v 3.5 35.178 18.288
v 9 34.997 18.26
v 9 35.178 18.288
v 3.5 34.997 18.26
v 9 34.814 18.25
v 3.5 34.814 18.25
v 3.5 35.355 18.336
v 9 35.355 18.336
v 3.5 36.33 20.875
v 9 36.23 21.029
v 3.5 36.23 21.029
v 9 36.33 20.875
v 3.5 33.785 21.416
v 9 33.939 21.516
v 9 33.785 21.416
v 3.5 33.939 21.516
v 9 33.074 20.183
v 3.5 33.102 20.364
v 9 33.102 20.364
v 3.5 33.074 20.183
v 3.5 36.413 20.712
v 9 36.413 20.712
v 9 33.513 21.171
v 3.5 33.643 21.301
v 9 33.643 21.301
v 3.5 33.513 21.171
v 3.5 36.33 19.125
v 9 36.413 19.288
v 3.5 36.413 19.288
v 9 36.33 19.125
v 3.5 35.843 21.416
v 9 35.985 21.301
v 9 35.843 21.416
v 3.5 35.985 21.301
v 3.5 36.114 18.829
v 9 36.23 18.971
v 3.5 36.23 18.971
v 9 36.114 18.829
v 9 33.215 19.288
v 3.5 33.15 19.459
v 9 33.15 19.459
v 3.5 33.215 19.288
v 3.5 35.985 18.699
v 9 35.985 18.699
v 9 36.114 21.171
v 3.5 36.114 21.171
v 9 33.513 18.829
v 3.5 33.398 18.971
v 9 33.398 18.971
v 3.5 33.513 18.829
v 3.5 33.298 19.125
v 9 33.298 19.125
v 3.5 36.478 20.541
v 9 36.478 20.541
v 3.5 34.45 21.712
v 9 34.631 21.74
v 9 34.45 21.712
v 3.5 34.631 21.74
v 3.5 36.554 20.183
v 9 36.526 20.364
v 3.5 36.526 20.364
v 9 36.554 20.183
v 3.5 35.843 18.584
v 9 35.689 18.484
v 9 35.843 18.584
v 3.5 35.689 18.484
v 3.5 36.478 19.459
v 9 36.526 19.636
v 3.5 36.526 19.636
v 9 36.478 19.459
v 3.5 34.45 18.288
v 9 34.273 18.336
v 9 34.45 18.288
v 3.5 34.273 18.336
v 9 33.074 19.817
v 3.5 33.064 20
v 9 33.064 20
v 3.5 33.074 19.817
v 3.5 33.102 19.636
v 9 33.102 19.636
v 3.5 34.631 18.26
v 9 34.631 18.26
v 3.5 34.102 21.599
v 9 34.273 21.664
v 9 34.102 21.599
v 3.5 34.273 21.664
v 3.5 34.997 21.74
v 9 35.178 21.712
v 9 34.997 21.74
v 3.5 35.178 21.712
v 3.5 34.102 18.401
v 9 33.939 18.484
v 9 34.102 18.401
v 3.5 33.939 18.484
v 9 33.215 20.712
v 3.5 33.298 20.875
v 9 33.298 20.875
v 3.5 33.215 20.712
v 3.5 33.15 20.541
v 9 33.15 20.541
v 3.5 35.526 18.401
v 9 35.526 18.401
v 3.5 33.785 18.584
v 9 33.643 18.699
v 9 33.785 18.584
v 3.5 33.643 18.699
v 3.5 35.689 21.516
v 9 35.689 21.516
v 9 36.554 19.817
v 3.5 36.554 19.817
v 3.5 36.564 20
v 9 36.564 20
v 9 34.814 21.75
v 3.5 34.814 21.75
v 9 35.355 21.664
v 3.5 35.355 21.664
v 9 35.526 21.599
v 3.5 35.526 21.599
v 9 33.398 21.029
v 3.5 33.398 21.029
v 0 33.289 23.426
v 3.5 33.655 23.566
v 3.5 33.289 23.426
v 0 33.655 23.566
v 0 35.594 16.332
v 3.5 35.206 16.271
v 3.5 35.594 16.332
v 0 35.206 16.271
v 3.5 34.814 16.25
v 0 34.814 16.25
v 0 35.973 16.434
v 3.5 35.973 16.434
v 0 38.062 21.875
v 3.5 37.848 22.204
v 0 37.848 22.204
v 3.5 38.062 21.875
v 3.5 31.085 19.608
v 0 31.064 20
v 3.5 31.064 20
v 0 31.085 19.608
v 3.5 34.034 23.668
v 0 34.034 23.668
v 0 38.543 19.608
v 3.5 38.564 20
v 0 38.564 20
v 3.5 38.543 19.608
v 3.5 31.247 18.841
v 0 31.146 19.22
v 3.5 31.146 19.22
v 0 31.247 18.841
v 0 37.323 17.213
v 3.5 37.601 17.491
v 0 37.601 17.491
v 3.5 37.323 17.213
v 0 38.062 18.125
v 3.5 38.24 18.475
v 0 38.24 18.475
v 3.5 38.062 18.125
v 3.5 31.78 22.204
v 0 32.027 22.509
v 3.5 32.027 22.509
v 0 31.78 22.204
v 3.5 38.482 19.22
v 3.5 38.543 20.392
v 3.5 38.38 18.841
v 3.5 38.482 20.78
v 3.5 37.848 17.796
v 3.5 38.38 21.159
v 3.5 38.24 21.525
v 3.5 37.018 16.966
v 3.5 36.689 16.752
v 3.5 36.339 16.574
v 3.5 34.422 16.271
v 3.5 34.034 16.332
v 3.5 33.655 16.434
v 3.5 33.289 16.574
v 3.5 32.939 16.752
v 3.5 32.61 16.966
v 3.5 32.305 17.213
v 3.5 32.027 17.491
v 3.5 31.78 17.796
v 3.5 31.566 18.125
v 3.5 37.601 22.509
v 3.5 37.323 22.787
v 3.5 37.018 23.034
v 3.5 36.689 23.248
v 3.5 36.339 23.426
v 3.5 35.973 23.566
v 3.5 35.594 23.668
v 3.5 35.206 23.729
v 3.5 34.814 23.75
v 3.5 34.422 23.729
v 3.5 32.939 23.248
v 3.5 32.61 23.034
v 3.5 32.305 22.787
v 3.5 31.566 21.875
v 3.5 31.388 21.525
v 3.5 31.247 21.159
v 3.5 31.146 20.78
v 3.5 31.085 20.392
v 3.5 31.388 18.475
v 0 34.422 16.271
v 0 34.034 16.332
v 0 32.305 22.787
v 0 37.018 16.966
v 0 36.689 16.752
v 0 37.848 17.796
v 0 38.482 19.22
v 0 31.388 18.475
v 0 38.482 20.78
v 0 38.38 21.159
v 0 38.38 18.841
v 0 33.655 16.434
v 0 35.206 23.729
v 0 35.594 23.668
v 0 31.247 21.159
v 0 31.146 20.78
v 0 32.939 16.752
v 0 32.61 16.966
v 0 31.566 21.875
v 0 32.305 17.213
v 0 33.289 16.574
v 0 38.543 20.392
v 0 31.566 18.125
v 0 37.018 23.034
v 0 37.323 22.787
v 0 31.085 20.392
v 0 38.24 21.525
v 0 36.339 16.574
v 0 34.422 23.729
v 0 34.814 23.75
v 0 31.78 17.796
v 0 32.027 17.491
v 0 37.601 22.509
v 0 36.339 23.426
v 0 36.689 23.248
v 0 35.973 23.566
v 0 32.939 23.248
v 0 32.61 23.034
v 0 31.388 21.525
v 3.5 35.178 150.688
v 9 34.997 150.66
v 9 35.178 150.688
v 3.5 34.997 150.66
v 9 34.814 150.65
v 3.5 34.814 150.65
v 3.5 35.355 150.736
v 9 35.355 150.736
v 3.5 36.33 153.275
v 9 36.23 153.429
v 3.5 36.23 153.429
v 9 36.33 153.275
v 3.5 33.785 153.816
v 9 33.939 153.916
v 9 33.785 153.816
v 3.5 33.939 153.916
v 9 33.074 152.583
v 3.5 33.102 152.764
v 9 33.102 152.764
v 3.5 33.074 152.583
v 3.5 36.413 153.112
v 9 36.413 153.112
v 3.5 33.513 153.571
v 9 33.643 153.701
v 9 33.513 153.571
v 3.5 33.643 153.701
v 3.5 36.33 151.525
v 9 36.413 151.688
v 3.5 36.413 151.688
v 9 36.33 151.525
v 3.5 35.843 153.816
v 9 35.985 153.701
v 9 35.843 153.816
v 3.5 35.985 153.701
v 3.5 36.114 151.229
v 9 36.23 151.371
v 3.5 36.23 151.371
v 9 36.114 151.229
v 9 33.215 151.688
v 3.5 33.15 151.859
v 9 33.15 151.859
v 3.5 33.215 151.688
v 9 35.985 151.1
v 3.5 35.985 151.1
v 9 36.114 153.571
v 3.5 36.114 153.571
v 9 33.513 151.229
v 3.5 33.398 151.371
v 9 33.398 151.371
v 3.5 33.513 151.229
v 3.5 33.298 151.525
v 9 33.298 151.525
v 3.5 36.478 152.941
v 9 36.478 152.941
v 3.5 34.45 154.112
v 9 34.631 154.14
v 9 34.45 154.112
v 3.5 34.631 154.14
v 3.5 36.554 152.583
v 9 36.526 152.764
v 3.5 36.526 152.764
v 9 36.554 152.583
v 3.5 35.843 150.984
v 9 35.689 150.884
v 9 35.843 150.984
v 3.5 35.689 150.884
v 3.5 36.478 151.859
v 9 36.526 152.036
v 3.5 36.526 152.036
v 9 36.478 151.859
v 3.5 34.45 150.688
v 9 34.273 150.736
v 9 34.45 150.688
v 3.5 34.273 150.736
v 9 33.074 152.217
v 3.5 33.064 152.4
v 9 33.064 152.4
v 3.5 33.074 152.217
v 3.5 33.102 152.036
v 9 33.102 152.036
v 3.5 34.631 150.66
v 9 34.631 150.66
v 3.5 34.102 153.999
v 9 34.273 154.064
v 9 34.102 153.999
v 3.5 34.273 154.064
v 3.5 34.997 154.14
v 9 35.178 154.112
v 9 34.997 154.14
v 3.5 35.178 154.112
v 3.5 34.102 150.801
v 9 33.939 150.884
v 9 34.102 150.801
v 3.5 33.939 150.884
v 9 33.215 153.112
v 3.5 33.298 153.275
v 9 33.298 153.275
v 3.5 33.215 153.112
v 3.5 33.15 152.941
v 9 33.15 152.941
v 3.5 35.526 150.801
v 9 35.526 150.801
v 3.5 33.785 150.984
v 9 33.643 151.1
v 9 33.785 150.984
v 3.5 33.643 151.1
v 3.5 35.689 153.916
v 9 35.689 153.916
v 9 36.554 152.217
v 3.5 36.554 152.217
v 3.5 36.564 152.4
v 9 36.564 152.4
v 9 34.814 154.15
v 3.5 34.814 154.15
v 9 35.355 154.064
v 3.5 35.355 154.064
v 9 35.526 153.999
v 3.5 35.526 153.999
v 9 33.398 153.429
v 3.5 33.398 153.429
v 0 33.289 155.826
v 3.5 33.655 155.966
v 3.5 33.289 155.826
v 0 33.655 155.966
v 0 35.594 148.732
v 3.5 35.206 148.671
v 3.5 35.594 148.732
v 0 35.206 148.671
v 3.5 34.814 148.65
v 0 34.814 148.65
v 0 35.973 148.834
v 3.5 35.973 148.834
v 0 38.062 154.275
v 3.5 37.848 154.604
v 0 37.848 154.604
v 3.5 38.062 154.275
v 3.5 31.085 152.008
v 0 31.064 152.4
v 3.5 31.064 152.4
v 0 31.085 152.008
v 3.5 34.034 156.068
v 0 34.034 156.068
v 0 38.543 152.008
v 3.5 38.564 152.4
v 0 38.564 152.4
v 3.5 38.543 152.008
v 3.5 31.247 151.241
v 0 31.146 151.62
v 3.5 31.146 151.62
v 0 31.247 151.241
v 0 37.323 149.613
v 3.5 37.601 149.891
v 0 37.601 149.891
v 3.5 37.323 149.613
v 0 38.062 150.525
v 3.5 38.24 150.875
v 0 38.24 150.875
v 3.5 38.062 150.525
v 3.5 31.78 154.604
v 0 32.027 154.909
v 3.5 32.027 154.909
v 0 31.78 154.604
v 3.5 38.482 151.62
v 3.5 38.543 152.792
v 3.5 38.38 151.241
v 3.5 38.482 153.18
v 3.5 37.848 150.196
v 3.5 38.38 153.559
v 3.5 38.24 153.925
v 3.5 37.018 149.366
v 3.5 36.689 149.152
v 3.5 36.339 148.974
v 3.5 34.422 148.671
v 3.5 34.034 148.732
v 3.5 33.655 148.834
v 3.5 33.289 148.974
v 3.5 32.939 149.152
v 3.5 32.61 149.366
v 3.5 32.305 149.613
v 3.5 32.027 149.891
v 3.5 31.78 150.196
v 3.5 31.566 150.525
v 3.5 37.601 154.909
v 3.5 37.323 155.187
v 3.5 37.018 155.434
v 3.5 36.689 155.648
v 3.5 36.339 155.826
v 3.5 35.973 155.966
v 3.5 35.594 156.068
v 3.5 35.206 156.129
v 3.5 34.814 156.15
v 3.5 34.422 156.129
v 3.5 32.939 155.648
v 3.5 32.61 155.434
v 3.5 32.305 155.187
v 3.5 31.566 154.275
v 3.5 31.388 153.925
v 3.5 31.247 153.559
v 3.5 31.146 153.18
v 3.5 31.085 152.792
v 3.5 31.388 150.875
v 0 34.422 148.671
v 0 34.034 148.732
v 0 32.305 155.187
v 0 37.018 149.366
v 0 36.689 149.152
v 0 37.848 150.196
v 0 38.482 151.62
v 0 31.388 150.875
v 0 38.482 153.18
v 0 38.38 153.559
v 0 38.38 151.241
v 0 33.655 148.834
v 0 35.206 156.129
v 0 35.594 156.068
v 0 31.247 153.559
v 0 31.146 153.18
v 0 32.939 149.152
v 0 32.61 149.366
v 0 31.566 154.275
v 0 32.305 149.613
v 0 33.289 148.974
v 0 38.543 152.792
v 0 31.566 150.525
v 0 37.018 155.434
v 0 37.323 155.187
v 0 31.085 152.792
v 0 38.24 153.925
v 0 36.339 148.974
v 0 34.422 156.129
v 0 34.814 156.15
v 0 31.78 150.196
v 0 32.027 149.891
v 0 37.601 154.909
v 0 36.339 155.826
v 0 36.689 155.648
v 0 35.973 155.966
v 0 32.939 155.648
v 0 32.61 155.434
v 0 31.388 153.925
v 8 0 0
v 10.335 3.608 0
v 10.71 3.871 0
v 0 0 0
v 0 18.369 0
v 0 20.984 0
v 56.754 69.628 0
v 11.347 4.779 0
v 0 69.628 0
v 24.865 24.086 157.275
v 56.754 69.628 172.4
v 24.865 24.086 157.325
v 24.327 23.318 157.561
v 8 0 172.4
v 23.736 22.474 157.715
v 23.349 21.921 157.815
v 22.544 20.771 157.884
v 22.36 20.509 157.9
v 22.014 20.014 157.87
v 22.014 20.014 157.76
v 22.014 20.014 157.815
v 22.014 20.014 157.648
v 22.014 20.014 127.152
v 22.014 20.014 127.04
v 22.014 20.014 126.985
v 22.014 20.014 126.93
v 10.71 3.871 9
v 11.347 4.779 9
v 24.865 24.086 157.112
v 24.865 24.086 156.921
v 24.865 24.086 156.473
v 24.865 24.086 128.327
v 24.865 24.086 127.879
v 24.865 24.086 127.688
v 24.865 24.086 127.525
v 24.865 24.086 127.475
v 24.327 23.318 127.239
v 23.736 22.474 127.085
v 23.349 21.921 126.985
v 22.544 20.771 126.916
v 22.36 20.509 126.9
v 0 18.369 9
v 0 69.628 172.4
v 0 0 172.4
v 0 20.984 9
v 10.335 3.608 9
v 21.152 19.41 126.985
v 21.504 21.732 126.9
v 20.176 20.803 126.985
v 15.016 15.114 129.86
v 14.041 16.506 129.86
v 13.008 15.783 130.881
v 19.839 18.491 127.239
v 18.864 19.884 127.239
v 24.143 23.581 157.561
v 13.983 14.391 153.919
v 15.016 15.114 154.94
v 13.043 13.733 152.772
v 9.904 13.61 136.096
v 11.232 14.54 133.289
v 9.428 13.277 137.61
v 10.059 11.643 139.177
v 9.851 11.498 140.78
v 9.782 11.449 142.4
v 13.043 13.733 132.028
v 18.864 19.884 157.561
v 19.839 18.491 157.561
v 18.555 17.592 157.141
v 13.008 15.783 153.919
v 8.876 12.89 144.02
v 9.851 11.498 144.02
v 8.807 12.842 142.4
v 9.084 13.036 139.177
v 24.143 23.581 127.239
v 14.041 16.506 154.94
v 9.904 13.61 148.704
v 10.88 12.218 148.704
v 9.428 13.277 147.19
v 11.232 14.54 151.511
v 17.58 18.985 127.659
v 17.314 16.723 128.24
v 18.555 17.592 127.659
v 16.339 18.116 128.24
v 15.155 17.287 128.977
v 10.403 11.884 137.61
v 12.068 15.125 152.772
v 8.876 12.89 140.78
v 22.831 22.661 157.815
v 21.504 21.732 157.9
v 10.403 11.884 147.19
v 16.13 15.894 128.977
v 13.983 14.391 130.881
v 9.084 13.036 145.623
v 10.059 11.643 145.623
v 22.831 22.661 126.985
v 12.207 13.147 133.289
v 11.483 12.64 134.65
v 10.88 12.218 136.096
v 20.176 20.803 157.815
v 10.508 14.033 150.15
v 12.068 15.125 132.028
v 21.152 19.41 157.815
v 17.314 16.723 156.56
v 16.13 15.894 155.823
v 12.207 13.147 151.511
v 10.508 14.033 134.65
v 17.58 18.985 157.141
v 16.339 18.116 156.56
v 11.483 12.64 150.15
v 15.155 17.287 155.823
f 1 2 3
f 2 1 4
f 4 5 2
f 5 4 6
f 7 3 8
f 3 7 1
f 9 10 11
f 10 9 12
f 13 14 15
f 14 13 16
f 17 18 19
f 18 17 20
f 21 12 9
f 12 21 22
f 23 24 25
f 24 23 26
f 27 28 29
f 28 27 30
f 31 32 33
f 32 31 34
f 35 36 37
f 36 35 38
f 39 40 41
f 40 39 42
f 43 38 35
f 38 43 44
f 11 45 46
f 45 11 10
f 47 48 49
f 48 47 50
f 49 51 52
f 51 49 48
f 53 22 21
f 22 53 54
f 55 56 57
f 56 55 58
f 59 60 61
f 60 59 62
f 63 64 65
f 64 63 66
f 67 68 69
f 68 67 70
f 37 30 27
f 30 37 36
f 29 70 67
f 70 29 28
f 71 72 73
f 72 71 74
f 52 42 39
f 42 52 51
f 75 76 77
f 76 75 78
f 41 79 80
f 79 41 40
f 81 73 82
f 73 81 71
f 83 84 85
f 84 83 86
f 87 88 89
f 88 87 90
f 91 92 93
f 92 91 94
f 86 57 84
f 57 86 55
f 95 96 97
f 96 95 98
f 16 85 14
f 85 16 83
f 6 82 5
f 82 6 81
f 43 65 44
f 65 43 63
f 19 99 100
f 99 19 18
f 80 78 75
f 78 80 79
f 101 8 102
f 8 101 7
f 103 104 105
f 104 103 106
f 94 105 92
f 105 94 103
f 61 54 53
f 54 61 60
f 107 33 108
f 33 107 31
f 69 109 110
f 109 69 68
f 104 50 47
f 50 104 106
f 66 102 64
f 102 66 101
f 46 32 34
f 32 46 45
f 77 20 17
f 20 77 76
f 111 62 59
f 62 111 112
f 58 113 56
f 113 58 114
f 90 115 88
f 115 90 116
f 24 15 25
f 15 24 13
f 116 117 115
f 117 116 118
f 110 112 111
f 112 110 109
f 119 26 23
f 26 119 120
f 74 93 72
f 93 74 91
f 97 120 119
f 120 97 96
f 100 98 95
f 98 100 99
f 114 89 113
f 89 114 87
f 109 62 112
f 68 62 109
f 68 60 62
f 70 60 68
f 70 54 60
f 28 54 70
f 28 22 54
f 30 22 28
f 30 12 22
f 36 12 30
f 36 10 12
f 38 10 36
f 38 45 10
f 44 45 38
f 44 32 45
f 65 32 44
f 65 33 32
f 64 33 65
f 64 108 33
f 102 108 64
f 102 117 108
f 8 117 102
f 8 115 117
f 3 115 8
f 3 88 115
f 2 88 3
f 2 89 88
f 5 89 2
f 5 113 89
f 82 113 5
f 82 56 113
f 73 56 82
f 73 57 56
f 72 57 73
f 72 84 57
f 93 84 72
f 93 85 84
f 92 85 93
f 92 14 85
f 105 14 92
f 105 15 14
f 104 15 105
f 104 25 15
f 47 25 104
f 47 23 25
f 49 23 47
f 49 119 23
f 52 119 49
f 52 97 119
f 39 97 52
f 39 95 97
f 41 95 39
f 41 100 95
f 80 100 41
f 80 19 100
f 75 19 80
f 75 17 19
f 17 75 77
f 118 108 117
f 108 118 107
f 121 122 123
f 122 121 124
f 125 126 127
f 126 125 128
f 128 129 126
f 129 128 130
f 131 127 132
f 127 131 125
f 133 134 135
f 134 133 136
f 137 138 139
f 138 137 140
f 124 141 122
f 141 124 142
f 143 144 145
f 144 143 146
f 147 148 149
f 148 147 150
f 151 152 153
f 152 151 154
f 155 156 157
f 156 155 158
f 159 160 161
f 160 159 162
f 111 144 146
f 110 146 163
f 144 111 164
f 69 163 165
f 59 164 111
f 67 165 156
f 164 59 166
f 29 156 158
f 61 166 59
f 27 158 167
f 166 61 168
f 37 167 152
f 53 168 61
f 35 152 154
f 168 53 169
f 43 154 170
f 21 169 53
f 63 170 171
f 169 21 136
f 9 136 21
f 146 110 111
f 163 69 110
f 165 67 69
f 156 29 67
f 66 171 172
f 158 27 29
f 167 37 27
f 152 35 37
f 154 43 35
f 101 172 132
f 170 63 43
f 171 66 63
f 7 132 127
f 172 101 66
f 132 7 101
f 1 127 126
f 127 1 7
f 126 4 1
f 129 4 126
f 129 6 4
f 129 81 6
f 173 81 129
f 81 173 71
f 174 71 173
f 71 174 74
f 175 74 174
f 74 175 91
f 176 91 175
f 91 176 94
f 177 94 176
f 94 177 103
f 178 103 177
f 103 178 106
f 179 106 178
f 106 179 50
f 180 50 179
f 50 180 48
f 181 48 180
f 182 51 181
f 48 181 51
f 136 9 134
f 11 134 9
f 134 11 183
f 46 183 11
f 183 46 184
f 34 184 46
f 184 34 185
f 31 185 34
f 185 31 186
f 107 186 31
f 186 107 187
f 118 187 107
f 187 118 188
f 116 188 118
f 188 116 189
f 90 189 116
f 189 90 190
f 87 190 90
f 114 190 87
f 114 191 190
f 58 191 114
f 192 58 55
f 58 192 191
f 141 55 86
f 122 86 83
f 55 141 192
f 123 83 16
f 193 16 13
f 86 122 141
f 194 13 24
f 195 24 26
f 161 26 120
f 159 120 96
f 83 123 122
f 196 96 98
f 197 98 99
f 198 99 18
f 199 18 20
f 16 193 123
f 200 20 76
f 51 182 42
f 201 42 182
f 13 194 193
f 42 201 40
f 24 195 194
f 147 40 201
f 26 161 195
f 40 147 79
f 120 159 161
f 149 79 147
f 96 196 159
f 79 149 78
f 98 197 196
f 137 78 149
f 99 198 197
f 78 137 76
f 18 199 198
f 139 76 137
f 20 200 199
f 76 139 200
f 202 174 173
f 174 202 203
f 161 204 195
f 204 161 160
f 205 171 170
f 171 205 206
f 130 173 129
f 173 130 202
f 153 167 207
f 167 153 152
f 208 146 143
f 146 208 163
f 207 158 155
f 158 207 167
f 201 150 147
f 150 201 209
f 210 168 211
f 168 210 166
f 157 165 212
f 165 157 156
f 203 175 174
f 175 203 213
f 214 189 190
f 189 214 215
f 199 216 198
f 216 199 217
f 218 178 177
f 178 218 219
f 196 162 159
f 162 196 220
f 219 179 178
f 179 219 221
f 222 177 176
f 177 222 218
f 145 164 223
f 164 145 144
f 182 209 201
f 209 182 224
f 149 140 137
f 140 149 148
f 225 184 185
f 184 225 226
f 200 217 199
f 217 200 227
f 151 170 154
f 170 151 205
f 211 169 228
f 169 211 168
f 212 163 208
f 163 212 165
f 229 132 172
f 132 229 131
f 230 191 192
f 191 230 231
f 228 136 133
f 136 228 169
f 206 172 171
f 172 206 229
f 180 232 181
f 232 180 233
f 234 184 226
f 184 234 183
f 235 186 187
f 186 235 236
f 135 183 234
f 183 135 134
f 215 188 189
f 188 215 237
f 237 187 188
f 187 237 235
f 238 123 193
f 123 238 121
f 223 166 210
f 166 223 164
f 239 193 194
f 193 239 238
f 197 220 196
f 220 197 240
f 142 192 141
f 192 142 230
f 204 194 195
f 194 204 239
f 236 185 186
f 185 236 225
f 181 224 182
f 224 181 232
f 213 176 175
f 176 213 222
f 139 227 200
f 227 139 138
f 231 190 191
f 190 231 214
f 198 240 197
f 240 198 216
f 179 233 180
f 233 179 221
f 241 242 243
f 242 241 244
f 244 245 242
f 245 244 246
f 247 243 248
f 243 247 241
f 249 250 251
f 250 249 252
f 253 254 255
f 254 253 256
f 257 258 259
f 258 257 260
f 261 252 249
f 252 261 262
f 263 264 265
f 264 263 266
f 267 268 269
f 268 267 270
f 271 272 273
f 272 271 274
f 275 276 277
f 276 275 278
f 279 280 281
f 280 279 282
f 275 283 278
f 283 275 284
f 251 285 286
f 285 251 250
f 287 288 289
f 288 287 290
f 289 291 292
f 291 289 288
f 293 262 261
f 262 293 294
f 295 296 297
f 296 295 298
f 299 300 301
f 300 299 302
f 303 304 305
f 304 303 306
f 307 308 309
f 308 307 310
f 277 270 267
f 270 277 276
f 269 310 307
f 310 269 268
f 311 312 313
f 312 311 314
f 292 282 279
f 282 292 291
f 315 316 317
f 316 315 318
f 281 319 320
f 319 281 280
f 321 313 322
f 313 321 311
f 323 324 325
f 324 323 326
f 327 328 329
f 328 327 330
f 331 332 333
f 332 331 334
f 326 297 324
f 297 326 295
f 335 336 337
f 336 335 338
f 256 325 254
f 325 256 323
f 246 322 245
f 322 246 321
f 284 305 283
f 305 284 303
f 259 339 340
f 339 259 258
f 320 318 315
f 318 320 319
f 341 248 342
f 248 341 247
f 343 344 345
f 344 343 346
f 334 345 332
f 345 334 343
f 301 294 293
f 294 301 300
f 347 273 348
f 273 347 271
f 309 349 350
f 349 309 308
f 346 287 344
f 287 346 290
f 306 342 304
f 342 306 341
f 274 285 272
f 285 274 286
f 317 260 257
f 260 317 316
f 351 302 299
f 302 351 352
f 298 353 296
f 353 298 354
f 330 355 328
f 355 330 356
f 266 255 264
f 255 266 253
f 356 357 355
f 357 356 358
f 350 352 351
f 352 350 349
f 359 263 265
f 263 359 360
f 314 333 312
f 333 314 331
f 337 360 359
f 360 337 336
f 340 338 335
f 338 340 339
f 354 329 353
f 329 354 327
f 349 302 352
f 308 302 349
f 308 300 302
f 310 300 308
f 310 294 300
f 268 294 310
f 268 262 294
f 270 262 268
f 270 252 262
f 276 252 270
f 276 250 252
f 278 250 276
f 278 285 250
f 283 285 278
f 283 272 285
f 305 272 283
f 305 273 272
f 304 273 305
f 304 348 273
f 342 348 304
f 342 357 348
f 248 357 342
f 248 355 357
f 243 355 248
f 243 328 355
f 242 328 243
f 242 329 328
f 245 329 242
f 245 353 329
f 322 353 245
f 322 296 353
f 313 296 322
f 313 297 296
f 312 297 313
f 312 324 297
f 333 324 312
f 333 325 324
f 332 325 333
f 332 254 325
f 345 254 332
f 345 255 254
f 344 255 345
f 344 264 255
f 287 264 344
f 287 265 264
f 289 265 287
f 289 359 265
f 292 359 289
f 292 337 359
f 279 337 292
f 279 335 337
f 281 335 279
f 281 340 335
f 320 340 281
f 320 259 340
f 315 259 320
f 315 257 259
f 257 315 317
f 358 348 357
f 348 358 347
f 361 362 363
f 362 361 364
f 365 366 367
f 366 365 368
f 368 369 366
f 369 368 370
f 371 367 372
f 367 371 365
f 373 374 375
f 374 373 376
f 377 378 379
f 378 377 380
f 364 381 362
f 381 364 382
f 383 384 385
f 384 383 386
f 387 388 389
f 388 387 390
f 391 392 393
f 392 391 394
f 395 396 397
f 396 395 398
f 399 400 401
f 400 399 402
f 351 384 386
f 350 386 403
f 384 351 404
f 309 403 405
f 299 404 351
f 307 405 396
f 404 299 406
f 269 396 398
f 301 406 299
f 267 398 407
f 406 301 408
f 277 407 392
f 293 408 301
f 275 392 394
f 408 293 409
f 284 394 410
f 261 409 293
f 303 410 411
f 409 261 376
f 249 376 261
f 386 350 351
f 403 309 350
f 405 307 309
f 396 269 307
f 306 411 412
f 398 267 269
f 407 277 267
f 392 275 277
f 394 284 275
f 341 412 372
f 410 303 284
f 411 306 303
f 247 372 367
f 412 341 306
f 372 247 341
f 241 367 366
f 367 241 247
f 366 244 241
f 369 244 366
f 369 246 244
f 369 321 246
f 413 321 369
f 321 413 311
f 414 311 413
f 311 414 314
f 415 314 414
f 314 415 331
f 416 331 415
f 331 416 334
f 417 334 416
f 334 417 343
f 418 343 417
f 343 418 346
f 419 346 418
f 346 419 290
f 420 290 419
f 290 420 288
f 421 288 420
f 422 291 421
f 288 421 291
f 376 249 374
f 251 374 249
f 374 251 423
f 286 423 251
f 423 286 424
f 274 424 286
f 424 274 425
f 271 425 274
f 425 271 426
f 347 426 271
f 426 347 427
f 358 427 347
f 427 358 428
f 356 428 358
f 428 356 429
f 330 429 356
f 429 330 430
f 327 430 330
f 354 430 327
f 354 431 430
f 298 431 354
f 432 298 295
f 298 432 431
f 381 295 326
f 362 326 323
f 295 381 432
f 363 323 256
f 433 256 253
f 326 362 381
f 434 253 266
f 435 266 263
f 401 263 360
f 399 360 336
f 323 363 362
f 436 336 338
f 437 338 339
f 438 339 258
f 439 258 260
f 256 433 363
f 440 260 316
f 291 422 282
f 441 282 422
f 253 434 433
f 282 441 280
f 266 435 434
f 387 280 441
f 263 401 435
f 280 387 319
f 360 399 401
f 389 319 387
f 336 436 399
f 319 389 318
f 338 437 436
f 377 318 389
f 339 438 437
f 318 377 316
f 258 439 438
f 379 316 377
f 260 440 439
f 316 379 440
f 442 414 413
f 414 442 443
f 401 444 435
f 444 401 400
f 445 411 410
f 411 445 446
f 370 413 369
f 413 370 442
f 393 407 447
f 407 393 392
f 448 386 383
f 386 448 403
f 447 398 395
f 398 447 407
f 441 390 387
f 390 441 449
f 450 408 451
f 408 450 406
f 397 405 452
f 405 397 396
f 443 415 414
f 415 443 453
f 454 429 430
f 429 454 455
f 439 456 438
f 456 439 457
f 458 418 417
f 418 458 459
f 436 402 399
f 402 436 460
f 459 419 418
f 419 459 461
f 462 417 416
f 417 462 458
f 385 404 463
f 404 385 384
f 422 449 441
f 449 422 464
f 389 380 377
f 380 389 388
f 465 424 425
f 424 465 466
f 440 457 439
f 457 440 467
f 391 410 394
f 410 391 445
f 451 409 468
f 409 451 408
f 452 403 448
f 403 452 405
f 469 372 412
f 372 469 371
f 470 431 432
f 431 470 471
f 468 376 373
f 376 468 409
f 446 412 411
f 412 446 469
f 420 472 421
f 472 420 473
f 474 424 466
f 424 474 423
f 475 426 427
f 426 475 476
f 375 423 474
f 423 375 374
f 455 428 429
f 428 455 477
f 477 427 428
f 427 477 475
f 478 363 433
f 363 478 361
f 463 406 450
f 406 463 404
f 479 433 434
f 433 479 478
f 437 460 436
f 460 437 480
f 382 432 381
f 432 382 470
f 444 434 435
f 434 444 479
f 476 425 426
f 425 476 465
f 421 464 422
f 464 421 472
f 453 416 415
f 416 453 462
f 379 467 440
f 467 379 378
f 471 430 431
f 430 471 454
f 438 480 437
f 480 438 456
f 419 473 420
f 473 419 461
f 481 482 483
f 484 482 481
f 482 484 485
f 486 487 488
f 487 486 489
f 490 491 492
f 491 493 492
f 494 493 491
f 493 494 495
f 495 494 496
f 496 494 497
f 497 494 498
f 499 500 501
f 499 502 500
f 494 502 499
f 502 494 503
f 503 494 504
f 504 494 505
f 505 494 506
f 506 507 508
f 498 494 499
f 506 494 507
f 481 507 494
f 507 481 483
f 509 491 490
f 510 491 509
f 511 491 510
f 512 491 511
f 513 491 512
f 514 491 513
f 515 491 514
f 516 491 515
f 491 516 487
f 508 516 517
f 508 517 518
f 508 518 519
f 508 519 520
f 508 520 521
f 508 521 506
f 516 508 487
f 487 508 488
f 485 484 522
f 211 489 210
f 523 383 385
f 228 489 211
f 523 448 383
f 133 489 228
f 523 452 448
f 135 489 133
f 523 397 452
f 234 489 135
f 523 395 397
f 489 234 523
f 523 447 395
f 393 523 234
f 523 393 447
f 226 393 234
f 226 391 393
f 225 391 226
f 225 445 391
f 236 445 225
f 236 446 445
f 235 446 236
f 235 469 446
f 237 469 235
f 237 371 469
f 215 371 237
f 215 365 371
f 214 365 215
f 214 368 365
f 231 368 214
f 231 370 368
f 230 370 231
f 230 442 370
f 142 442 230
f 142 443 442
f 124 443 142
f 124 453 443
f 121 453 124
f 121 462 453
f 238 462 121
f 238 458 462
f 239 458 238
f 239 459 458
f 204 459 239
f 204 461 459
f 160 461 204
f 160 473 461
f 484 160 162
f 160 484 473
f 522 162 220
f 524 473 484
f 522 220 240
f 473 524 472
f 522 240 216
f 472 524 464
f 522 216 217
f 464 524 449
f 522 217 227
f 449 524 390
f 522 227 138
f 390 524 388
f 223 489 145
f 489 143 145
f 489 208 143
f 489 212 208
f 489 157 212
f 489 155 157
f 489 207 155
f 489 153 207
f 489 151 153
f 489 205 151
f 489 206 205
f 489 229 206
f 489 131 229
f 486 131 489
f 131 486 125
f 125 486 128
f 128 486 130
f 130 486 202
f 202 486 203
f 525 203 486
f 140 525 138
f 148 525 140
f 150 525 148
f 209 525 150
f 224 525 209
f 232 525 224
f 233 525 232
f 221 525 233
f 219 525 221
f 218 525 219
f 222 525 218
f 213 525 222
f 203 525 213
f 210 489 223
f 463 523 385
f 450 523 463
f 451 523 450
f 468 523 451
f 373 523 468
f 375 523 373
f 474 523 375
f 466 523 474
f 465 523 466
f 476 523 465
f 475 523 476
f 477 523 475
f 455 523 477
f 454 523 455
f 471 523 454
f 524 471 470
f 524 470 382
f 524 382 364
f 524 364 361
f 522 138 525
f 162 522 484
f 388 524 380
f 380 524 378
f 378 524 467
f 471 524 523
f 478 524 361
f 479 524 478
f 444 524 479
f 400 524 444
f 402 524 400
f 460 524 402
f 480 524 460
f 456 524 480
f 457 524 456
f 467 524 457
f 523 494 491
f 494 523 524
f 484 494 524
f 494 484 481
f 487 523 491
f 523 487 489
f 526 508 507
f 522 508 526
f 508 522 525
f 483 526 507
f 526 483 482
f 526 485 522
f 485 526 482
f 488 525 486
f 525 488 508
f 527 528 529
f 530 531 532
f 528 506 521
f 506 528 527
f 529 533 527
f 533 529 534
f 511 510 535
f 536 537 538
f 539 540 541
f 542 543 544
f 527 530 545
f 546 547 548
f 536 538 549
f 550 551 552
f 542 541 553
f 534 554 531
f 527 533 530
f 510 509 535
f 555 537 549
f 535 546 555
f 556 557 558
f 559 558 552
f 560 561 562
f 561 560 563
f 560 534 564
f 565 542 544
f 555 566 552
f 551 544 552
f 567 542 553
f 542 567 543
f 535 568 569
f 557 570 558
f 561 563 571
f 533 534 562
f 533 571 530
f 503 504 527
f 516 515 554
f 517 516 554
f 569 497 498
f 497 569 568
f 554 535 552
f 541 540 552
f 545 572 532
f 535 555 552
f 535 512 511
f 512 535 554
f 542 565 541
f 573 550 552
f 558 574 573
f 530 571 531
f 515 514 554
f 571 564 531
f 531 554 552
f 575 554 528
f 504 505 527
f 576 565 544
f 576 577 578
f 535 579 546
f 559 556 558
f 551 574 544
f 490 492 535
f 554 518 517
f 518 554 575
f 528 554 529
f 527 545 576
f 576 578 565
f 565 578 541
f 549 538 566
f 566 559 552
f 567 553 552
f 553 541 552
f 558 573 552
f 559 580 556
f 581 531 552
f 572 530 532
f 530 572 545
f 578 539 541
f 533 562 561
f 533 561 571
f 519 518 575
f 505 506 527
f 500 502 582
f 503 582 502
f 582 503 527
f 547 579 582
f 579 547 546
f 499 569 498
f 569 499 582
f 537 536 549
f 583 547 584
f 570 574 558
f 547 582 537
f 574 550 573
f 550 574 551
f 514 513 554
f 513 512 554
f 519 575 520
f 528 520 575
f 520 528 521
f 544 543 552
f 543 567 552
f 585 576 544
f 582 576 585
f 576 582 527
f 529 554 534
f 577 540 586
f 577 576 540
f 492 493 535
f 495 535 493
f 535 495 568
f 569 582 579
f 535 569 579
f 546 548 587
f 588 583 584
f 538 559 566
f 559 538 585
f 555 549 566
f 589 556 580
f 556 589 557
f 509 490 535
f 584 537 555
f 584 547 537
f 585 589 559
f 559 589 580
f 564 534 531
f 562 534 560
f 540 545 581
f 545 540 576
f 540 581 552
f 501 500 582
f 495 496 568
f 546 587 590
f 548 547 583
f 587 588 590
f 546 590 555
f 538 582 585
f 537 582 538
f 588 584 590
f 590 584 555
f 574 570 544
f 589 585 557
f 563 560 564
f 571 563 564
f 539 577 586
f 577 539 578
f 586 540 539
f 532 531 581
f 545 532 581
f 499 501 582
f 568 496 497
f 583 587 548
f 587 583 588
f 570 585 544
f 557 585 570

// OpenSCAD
/*
 * Artifact — Label Placard Holder
 * =================================
 * Wall-mounted holder for 6"×3" (152.4mm × 76.2mm) printed labels.
 * Label face sits at 35° from the wall. Label slides in from either end.
 * 30mm NFC chip recess on the label face.
 *
 * Coordinate system:
 *   X = depth from wall  (0 = wall surface)
 *   Y = height           (0 = bottom)
 *   Z = length           (label slides along this axis)
 *
 * Print: PLA/PETG, 20% infill, back face (X=0) flat on bed, no supports needed.
 * Mount: 2× wood screws or M3.5 through the back face.
 */

$fn = 60;

// ── Parameters ───────────────────────────────────────────────────────────────

label_w  = 152.4;  // 6 inches
tilt     = 35;     // degrees from vertical (wall) — label leans at this angle

holder_l = label_w + 20;  // Z length — label has 10mm overhang each side

plate_t  = 8;   // wall plate thickness (X)
arm_h    = 85;  // arm face length (mm along the face itself)

slot_t   = 1.5;  // slot opening thickness — tight fit for cardstock
slot_d   = 10;   // slot depth into body

screw_d  = 3.5;
cbore_d  = 7.5;
cbore_h  = 3.5;

nfc_d    = 31;   // NFC recess diameter (30mm chip + 0.5mm clearance)
nfc_dep  = 1.5;  // NFC recess depth

// NFC position:
nfc_along = 25;         // mm up the arm face from the bottom
nfc_z     = holder_l - 30;  // mm from Z=0 end (right side of label when mounted)

// ── Derived ──────────────────────────────────────────────────────────────────

s = sin(tilt);   // sin 35° ≈ 0.574
c = cos(tilt);   // cos 35° ≈ 0.819

body_h = arm_h * c;  // total height of holder

// ── Body cross-section (XY polygon, extruded along Z) ────────────────────────
//
// Viewed from the end:
//
//   Y (height)
//   |
//   *──────────────* [arm_h*s + plate_t, arm_h*c]   ← arm top
//   |              /
//   |             /  ← arm face at 35° from vertical (label rests here)
//   |            /
//   |           /
//   *──────────* [plate_t, 0]  ← bottom of arm face / front of wall plate
//   [0,0]
//
//   Back face (X=0): mounts flush to wall
//   Bottom (Y=0): horizontal floor of holder
//   Arm face: angled at 35° — this is where the label rests

module body() {
    linear_extrude(holder_l) {
        polygon([
            [0,              0      ],   // back-bottom
            [plate_t,        0      ],   // front-bottom (wall plate edge)
            [plate_t + arm_h*s, arm_h*c],   // arm top-front
            [0,              arm_h*c]    // back-top
        ]);
    }
}

// ── Label slot ───────────────────────────────────────────────────────────────
//
// A thin channel cut along the full Z length at the base of the arm face.
// The label's bottom edge slides into this channel from either end.
//
// The slot center is `slot_from_base` mm up the arm face from its bottom corner.
// Direction of cut: perpendicular to arm face = inward normal [-c, s, 0] in XY.
//
// We define the slot as a cube in the arm face's local coordinate frame:
//   - Local "depth" axis (into body):  [-c, s] in XY  → rotate 90°+tilt from X
//   - Local "width" axis (along face): [ s, c] in XY
//   - Local "length" axis:             Z (unchanged)
//
// rotate([0, 0, 90+tilt]) then rotate([0, 90, 0]) aligns local Z with inward [-c,s,0]

slot_from_base = 5;  // mm up the arm face from its bottom corner [plate_t, 0]

module label_slot() {
    // Center of slot on the arm face in XY:
    cx = plate_t + slot_from_base * s;
    cy =           slot_from_base * c;

    // Small outward nudge so the cutter cleanly breaks through the face:
    ox = 0.1 * c;
    oy = -0.1 * s;

    translate([cx + ox, cy + oy, -1])
    rotate([0, 0, 90 + tilt])   // align local Y with face direction [s, c]
    rotate([0, 90, 0])          // local Z → local X (depth axis = inward normal)
    translate([-slot_d, -slot_t/2, 0])
    cube([slot_d + 0.1, slot_t, holder_l + 2]);
}

// ── NFC recess ───────────────────────────────────────────────────────────────
//
// Circular pocket on the arm face. Same rotation as the slot.
// Placed at nfc_along mm up the face and nfc_z along Z.

module nfc_recess() {
    cx = plate_t + nfc_along * s;
    cy =           nfc_along * c;

    ox = 0.1 * c;
    oy = -0.1 * s;

    translate([cx + ox, cy + oy, nfc_z])
    rotate([0, 0, 90 + tilt])
    rotate([0, 90, 0])
    translate([0, 0, -0.1])
    cylinder(d = nfc_d, h = nfc_dep + 0.2);
}

// ── Screw holes ──────────────────────────────────────────────────────────────
//
// Two countersunk holes through the back face (X=0), one near each Z end.
// rotate([0, 90, 0]) → cylinder axis along +X (into the body toward the wall).

module screw_holes() {
    screw_y = body_h * 0.5;  // midpoint of back face height

    for (z_pos = [20, holder_l - 20]) {
        translate([-1, screw_y, z_pos])
        rotate([0, 90, 0]) {
            cylinder(d = screw_d, h = plate_t + 2);   // through hole
            cylinder(d = cbore_d, h = cbore_h + 1);   // countersink
        }
    }
}

// ── Assembly ─────────────────────────────────────────────────────────────────

difference() {
    body();
    label_slot();
    nfc_recess();
    screw_holes();
}
